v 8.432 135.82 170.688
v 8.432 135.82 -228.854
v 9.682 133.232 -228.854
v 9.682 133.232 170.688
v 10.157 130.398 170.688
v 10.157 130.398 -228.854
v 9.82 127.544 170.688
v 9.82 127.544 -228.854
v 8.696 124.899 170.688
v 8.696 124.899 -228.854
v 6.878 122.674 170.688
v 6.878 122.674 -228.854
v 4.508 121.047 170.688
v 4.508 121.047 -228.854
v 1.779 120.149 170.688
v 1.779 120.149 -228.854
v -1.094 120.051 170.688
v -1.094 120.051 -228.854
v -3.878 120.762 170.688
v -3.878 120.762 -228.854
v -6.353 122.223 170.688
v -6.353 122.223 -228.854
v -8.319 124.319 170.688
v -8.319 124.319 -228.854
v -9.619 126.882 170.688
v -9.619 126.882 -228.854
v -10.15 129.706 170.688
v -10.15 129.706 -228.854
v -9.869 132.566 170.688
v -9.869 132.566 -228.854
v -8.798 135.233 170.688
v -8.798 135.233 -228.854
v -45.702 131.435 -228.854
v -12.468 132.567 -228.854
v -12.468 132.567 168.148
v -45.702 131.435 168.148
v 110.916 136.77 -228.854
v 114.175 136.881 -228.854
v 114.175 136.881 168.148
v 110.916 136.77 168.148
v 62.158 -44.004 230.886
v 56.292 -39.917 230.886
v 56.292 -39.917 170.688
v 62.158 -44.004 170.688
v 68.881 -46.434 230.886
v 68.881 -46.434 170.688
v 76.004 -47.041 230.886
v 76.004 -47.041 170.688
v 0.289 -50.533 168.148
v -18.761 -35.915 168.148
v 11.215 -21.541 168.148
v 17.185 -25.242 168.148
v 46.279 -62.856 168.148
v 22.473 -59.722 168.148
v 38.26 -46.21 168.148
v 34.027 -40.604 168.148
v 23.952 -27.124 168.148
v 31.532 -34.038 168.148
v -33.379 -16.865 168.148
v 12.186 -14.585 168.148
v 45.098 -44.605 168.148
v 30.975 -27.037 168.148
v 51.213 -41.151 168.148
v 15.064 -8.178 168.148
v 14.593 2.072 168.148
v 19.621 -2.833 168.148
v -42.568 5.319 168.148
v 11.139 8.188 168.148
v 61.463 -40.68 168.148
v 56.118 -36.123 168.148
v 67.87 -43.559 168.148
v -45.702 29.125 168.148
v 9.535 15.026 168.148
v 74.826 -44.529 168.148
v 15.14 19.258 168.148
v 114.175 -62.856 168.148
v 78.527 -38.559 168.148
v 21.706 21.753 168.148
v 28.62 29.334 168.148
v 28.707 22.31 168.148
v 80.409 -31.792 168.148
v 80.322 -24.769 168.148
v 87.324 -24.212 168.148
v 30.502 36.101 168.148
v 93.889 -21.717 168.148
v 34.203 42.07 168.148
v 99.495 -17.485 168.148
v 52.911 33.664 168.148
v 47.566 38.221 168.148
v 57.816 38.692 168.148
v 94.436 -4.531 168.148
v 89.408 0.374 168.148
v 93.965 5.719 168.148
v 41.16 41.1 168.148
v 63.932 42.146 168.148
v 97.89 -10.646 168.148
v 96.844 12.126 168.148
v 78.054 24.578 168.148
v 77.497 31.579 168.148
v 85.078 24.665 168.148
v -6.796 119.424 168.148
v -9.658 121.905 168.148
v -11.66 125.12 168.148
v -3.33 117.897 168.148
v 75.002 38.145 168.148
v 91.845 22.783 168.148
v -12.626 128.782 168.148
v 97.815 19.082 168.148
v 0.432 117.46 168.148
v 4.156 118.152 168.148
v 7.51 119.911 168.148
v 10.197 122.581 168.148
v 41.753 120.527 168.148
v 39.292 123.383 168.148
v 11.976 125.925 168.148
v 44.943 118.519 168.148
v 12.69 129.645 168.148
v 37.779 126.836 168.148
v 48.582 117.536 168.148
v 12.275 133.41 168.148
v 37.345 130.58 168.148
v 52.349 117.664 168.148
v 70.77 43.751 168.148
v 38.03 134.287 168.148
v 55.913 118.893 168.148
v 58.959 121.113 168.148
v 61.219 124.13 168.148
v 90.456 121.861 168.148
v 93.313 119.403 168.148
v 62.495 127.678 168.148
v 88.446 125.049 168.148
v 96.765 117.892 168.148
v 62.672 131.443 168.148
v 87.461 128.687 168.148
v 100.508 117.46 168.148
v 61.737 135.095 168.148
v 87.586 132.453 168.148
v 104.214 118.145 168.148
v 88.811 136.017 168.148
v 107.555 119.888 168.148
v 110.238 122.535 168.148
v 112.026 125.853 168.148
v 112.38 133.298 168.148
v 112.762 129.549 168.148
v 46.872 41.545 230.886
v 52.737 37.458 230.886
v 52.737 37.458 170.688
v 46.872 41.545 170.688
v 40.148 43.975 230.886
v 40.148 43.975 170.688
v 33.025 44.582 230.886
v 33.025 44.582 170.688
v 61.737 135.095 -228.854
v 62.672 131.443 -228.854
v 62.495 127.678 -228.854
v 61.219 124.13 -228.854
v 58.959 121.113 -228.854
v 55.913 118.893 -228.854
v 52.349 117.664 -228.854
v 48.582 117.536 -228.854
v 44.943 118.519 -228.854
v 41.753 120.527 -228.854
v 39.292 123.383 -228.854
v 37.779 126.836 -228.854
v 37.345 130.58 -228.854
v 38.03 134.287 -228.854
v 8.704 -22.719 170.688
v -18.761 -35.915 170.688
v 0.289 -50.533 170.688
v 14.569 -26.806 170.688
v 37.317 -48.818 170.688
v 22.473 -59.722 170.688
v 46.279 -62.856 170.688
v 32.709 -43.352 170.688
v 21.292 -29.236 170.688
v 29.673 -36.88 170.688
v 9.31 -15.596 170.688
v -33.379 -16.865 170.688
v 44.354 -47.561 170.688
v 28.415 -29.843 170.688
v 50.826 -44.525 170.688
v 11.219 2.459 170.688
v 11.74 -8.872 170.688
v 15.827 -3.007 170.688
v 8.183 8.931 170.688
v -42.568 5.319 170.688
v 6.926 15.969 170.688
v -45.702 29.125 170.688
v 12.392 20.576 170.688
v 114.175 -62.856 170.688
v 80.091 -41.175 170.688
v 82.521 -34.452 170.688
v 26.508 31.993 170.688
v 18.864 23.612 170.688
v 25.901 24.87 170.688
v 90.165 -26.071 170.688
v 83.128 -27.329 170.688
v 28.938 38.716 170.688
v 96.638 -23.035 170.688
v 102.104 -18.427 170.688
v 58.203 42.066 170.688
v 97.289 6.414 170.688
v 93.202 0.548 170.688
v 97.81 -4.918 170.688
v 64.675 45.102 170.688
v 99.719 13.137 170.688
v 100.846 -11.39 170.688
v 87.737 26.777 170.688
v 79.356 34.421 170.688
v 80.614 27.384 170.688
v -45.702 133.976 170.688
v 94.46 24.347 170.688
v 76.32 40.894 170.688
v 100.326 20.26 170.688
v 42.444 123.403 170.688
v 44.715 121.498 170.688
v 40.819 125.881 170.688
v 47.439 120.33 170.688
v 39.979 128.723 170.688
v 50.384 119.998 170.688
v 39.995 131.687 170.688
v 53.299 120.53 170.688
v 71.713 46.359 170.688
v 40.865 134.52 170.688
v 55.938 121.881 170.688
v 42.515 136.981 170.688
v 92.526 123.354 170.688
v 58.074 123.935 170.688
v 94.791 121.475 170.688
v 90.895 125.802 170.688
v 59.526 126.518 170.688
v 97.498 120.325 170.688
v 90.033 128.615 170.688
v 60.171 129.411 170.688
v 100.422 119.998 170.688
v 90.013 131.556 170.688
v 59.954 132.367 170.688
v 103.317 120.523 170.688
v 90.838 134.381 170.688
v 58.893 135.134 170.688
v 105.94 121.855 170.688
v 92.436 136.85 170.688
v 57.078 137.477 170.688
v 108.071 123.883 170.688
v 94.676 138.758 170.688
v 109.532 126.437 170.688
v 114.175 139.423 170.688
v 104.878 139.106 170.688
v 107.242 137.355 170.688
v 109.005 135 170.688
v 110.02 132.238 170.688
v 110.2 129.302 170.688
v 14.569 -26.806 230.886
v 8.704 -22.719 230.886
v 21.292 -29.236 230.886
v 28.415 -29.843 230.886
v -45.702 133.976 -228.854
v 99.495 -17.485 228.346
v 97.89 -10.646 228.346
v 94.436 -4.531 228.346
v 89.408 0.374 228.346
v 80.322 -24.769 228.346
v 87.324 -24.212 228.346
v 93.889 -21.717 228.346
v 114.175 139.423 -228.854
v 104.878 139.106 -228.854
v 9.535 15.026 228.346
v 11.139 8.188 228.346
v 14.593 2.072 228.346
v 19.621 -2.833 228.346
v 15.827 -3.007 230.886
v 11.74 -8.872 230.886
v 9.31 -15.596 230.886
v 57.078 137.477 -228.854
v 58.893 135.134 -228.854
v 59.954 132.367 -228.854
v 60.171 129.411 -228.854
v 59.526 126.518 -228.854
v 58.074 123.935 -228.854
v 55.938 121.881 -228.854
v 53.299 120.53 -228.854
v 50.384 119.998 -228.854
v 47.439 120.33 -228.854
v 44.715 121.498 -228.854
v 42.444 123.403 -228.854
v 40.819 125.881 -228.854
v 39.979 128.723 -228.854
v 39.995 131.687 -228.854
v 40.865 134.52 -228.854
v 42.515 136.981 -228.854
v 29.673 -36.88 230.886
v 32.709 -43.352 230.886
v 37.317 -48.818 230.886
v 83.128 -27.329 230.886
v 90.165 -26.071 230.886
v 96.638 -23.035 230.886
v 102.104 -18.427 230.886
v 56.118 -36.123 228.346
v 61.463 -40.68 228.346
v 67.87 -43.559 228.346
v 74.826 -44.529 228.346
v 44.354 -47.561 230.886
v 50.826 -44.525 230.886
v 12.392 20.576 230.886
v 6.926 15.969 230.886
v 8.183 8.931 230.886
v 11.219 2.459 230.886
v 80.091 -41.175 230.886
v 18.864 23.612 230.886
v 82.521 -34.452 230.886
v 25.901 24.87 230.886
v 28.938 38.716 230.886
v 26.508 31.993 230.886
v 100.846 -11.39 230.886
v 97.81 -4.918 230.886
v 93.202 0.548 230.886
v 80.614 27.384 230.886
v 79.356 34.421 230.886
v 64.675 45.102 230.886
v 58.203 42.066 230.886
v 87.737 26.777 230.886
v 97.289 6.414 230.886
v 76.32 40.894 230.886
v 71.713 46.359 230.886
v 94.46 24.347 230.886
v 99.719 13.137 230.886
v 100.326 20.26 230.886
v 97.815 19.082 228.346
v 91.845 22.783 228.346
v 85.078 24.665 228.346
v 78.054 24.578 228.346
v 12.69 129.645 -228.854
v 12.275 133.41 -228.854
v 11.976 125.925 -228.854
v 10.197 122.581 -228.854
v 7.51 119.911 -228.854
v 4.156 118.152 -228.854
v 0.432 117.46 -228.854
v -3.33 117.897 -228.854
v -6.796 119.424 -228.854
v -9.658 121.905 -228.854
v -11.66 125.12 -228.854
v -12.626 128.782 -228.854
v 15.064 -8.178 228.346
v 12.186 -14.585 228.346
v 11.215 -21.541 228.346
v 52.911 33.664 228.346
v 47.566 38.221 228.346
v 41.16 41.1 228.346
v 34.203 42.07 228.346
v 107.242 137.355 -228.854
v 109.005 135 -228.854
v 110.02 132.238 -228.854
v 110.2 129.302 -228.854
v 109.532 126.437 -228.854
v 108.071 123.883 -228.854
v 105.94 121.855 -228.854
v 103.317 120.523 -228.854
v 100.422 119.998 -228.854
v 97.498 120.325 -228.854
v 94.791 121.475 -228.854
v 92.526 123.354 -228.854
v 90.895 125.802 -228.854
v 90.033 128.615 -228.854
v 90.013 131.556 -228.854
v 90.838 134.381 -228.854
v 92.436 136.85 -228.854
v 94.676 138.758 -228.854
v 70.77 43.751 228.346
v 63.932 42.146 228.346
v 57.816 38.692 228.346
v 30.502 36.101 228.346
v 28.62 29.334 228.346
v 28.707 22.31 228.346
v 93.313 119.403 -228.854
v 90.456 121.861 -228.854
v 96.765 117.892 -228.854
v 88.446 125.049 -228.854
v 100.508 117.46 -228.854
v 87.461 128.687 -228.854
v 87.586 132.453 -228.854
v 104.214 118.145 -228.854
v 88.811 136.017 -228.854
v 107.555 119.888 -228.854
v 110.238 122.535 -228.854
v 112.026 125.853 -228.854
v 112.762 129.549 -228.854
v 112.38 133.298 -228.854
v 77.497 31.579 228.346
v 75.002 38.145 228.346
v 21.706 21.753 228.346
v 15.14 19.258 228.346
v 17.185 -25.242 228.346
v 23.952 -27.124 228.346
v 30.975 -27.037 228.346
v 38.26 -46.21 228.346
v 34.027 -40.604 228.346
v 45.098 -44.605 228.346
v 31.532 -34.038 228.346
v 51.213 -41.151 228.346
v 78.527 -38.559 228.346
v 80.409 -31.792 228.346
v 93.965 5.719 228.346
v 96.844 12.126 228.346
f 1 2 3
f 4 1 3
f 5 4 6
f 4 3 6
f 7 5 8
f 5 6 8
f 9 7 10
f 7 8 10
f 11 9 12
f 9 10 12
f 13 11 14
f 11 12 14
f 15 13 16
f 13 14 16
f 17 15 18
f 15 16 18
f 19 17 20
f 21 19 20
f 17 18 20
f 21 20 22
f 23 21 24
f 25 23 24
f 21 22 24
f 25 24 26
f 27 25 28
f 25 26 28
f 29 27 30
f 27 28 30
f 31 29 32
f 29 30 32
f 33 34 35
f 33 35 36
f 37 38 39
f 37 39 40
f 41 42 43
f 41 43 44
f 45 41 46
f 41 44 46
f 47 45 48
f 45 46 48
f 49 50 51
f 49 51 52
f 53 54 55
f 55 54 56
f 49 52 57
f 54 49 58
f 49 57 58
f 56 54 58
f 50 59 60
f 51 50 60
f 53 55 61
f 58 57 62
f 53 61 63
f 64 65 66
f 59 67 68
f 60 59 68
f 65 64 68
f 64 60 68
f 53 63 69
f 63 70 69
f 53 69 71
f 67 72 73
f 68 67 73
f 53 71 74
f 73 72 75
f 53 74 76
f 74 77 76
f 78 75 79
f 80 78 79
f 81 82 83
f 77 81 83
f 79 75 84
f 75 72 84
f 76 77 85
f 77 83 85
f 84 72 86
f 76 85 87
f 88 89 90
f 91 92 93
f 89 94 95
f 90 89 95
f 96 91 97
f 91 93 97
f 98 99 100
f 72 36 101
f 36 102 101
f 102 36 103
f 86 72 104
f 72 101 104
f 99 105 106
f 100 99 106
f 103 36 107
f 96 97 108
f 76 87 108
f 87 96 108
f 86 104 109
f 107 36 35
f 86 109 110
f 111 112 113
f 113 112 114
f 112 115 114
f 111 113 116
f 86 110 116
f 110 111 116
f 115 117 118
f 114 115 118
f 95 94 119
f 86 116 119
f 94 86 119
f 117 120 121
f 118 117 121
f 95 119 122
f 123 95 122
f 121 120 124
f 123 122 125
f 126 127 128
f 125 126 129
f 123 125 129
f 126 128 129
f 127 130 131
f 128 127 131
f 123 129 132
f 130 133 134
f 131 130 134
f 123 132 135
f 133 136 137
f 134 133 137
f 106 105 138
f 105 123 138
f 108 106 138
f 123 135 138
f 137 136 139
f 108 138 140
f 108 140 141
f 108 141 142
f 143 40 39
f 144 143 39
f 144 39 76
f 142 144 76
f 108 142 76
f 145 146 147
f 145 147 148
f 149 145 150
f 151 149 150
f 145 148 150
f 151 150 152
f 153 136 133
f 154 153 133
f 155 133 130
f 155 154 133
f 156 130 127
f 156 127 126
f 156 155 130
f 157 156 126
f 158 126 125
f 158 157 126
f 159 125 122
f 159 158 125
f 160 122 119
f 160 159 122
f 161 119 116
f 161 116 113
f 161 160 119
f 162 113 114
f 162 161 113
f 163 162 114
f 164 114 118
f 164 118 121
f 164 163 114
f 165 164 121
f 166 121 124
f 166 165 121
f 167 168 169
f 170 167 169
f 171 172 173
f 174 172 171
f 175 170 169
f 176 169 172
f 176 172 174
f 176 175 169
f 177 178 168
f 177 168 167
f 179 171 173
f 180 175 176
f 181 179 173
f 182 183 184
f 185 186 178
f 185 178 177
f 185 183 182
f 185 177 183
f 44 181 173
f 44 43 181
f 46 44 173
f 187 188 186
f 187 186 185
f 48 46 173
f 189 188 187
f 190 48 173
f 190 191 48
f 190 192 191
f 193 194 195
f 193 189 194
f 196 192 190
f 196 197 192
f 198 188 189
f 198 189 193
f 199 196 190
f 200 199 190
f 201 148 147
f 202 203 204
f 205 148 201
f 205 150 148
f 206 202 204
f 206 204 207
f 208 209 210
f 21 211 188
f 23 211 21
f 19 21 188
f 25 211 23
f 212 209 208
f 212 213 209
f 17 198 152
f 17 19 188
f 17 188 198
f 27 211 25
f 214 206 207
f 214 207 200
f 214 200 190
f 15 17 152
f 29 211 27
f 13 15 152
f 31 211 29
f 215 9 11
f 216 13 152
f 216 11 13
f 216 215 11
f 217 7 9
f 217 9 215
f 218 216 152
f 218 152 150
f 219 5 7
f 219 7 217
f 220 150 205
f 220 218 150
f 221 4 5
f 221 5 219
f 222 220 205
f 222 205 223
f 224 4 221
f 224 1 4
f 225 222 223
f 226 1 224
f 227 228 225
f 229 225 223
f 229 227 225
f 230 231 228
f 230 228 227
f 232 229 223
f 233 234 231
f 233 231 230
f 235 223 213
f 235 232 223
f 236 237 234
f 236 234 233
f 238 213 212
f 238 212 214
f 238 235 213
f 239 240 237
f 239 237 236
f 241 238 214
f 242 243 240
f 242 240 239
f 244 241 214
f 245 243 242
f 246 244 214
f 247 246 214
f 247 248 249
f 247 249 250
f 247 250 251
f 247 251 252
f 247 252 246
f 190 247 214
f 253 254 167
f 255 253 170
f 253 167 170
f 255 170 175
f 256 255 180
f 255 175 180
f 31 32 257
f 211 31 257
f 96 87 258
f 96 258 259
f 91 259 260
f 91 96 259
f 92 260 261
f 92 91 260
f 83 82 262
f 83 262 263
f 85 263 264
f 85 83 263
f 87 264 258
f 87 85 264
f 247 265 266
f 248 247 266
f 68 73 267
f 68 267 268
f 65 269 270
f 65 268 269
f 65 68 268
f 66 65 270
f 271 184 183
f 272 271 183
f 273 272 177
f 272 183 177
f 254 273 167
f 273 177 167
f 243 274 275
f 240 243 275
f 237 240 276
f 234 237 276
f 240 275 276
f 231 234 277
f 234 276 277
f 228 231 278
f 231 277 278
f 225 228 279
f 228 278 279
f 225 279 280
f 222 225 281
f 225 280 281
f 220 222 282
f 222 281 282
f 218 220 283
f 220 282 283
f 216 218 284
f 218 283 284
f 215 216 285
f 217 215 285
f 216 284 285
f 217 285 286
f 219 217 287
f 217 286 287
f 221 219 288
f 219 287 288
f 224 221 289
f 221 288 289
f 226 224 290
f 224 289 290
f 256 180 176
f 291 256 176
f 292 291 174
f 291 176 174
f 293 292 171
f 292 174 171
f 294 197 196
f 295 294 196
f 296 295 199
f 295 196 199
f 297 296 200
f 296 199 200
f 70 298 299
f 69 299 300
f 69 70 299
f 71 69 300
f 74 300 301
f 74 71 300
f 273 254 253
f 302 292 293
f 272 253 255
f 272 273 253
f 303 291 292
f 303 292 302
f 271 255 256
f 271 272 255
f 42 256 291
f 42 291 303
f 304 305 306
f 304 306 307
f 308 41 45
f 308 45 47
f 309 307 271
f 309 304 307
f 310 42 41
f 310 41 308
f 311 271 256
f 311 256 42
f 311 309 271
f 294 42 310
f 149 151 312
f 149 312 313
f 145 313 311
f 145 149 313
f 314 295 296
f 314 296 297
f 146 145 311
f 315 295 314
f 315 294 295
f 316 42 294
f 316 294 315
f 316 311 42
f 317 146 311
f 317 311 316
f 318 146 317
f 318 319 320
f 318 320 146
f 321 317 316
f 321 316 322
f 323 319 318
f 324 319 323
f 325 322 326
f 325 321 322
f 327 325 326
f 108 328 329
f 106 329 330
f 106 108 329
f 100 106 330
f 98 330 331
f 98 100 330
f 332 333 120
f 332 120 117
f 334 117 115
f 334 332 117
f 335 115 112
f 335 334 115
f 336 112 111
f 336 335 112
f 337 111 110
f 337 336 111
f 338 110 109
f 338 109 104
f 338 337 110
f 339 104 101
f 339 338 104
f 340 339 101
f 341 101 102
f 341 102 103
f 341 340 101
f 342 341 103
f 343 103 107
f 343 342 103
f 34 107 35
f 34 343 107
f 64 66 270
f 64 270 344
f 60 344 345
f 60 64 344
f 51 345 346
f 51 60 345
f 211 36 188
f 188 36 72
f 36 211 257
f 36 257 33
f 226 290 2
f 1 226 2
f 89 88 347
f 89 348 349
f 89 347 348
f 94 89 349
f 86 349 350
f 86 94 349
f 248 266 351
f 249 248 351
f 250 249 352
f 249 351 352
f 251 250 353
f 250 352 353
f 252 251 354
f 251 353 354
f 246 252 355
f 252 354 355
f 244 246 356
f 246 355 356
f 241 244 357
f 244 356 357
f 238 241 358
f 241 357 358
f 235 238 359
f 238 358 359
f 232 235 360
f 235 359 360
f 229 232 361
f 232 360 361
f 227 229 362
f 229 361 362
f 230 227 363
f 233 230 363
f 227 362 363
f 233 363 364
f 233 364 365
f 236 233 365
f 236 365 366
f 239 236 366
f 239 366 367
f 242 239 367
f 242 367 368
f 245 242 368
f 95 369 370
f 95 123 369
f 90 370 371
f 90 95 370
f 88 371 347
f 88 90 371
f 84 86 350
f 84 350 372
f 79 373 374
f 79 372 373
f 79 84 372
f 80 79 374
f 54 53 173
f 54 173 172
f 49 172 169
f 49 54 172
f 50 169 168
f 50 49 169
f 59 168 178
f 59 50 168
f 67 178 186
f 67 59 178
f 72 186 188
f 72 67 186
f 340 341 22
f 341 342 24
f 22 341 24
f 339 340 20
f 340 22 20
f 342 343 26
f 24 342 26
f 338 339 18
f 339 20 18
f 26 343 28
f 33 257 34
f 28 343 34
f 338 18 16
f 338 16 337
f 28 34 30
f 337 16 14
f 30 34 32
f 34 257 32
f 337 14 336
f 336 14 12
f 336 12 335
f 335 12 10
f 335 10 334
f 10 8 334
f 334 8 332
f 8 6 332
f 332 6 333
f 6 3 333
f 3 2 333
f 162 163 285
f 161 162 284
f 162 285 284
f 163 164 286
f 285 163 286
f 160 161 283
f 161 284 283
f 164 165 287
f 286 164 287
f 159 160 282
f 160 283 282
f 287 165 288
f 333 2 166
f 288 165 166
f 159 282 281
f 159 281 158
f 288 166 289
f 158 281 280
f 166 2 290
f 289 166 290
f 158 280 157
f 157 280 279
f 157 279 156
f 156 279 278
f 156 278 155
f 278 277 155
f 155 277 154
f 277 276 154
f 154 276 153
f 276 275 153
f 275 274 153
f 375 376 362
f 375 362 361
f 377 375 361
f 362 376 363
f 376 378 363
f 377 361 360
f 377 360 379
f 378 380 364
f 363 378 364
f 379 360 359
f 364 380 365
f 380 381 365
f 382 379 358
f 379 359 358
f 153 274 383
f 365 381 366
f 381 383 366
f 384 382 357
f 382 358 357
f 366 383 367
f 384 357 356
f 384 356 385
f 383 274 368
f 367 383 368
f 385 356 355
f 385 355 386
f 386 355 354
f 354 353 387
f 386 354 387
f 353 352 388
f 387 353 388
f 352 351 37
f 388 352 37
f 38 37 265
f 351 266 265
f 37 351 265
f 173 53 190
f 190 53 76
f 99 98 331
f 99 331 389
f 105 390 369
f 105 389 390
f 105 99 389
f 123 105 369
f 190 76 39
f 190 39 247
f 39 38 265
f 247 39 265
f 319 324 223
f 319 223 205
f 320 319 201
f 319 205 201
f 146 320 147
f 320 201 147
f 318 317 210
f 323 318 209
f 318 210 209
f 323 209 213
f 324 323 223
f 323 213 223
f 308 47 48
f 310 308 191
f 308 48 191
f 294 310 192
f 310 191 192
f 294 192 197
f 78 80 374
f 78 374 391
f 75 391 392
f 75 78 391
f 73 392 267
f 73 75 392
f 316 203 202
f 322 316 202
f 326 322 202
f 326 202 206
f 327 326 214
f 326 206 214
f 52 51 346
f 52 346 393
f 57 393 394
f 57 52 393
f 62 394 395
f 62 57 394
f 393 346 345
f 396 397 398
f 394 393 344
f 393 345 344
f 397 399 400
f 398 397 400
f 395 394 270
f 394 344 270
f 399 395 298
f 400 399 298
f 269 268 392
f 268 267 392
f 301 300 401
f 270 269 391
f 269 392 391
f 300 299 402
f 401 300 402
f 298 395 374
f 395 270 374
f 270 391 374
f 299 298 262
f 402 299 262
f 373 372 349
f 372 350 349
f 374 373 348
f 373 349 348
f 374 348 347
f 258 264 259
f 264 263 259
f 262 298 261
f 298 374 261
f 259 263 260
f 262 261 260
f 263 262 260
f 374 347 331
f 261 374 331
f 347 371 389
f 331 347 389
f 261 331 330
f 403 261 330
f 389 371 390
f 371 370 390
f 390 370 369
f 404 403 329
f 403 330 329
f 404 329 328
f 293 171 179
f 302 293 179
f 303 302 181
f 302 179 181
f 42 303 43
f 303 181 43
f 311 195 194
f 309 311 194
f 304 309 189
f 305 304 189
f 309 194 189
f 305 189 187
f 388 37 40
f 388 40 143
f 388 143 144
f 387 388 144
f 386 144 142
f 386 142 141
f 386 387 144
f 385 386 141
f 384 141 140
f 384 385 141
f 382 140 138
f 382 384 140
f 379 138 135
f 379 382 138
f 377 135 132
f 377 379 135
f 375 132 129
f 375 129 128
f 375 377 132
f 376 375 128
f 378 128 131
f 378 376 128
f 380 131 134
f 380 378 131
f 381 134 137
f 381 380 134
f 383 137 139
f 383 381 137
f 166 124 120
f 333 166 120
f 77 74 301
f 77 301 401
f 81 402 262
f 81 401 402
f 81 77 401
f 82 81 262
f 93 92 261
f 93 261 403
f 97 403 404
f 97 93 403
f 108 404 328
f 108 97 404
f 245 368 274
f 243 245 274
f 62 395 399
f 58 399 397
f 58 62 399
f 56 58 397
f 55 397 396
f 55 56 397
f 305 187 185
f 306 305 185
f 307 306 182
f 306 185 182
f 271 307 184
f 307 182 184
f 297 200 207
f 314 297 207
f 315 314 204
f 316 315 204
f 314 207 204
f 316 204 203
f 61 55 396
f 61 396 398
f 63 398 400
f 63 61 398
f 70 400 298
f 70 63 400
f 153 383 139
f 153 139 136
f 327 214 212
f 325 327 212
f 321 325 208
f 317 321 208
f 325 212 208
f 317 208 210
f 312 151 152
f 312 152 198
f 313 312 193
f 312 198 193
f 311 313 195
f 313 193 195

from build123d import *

# Parameters (mm, degrees)
F1_DEPTH      = 228.854
F1_DEPTH_BACK = 170.688
F3_D          = 20.32
F4_R          = 91.9815367264
F5_DEPTH      = 60.198
F6_T          = -2.54


with BuildPart() as f1:
    # F0 (on Top) → F1 (new body, two sides)
    with BuildSketch(Plane.XY) as f1_sk:
        Polygon((-45.7021147013, -62.8560557961), (0, -62.8560557961), (57.0875890553, -62.8560557961), (114.1751781106, -62.8560557961), (114.1751781106, 35.5600006878), (114.1751781106, 126.9761919975), (114.1751781106, 133.9760571718), (114.1751781106, 139.4225805998), (-45.7021147013, 133.9760571718), (-45.7021147013, 35.5600006878), align=None)
    extrude(amount=-F1_DEPTH)
    extrude(f1_sk.sketch, amount=F1_DEPTH_BACK)

    # F3 (through all)
    with Locations(Plane.XY.offset(170.688)):
        with Locations((0, 130.152374506), (50.038, 130.152374506), (100.076, 130.152374506)):
            Hole(F3_D / 2)

    # F4
    f4_edges = [f1.edges().sort_by_distance(p)[0] for p in [
        (-45.702115, -62.856056, -29.083),
    ]]
    fillet(f4_edges, radius=F4_R)

    # F2 (on face) → F5 (join)
    with BuildSketch(Plane.XY.offset(170.688)):
        with BuildLine():
            ThreePointArc((52.7370204776, 37.4581152183), (43.5895428052, 42.9803944735), (33.0250906296, 44.5817270971))
            ThreePointArc((33.0250906296, 44.5817270971), (27.5028113743, 35.4342494247), (25.9014787508, 24.8697972491))
            ThreePointArc((25.9014787508, 24.8697972491), (15.5283941488, 22.3063948652), (6.9258852189, 15.9685122494))
            ThreePointArc((6.9258852189, 15.9685122494), (9.4892876028, 5.5954276475), (15.8271702186, -3.0070812824))
            ThreePointArc((15.8271702186, -3.0070812824), (10.3048909633, -12.1545589549), (8.7035583398, -22.7190111304))
            ThreePointArc((8.7035583398, -22.7190111304), (17.8510360122, -28.2412903857), (28.4154881878, -29.8426230093))
            ThreePointArc((28.4154881878, -29.8426230093), (30.9788905717, -40.2157076112), (37.3167731875, -48.8182165411))
            ThreePointArc((37.3167731875, -48.8182165411), (47.6898577894, -46.2548141572), (56.2923667193, -39.9169315414))
            ThreePointArc((56.2923667193, -39.9169315414), (65.4398443918, -45.4392107967), (76.0042965673, -47.0405434203))
            ThreePointArc((76.0042965673, -47.0405434203), (81.5265758226, -37.8930657478), (83.1279084462, -27.3286135723))
            ThreePointArc((83.1279084462, -27.3286135723), (93.5009930481, -24.7652111884), (102.103501978, -18.4273285726))
            ThreePointArc((102.103501978, -18.4273285726), (99.5400995941, -8.0542439706), (93.2022169783, 0.5482649593))
            ThreePointArc((93.2022169783, 0.5482649593), (98.7244962336, 9.6957426317), (100.3258288572, 20.2601948073))
            ThreePointArc((100.3258288572, 20.2601948073), (91.1783511847, 25.7824740625), (80.6138990092, 27.3838066861))
            ThreePointArc((80.6138990092, 27.3838066861), (78.0504966252, 37.7568912881), (71.7126140095, 46.359400218))
            ThreePointArc((71.7126140095, 46.359400218), (61.3395294075, 43.795997834), (52.7370204776, 37.4581152183))
        make_face()
    extrude(amount=F5_DEPTH)

    # F6
    f6_openings = [f1.faces().sort_by_distance(p)[0] for p in [
        (-18.761346, -35.915287, -29.083),
        (-45.702115, 81.550769, -29.083),
        (37.767676, 39.089228, -228.854),
        (114.175178, 38.283262, -29.083),
        (80.2273, -62.856056, -29.083),
    ]]
    offset(amount=F6_T, openings=f6_openings, kind=Kind.INTERSECTION)


solid = f1.part
